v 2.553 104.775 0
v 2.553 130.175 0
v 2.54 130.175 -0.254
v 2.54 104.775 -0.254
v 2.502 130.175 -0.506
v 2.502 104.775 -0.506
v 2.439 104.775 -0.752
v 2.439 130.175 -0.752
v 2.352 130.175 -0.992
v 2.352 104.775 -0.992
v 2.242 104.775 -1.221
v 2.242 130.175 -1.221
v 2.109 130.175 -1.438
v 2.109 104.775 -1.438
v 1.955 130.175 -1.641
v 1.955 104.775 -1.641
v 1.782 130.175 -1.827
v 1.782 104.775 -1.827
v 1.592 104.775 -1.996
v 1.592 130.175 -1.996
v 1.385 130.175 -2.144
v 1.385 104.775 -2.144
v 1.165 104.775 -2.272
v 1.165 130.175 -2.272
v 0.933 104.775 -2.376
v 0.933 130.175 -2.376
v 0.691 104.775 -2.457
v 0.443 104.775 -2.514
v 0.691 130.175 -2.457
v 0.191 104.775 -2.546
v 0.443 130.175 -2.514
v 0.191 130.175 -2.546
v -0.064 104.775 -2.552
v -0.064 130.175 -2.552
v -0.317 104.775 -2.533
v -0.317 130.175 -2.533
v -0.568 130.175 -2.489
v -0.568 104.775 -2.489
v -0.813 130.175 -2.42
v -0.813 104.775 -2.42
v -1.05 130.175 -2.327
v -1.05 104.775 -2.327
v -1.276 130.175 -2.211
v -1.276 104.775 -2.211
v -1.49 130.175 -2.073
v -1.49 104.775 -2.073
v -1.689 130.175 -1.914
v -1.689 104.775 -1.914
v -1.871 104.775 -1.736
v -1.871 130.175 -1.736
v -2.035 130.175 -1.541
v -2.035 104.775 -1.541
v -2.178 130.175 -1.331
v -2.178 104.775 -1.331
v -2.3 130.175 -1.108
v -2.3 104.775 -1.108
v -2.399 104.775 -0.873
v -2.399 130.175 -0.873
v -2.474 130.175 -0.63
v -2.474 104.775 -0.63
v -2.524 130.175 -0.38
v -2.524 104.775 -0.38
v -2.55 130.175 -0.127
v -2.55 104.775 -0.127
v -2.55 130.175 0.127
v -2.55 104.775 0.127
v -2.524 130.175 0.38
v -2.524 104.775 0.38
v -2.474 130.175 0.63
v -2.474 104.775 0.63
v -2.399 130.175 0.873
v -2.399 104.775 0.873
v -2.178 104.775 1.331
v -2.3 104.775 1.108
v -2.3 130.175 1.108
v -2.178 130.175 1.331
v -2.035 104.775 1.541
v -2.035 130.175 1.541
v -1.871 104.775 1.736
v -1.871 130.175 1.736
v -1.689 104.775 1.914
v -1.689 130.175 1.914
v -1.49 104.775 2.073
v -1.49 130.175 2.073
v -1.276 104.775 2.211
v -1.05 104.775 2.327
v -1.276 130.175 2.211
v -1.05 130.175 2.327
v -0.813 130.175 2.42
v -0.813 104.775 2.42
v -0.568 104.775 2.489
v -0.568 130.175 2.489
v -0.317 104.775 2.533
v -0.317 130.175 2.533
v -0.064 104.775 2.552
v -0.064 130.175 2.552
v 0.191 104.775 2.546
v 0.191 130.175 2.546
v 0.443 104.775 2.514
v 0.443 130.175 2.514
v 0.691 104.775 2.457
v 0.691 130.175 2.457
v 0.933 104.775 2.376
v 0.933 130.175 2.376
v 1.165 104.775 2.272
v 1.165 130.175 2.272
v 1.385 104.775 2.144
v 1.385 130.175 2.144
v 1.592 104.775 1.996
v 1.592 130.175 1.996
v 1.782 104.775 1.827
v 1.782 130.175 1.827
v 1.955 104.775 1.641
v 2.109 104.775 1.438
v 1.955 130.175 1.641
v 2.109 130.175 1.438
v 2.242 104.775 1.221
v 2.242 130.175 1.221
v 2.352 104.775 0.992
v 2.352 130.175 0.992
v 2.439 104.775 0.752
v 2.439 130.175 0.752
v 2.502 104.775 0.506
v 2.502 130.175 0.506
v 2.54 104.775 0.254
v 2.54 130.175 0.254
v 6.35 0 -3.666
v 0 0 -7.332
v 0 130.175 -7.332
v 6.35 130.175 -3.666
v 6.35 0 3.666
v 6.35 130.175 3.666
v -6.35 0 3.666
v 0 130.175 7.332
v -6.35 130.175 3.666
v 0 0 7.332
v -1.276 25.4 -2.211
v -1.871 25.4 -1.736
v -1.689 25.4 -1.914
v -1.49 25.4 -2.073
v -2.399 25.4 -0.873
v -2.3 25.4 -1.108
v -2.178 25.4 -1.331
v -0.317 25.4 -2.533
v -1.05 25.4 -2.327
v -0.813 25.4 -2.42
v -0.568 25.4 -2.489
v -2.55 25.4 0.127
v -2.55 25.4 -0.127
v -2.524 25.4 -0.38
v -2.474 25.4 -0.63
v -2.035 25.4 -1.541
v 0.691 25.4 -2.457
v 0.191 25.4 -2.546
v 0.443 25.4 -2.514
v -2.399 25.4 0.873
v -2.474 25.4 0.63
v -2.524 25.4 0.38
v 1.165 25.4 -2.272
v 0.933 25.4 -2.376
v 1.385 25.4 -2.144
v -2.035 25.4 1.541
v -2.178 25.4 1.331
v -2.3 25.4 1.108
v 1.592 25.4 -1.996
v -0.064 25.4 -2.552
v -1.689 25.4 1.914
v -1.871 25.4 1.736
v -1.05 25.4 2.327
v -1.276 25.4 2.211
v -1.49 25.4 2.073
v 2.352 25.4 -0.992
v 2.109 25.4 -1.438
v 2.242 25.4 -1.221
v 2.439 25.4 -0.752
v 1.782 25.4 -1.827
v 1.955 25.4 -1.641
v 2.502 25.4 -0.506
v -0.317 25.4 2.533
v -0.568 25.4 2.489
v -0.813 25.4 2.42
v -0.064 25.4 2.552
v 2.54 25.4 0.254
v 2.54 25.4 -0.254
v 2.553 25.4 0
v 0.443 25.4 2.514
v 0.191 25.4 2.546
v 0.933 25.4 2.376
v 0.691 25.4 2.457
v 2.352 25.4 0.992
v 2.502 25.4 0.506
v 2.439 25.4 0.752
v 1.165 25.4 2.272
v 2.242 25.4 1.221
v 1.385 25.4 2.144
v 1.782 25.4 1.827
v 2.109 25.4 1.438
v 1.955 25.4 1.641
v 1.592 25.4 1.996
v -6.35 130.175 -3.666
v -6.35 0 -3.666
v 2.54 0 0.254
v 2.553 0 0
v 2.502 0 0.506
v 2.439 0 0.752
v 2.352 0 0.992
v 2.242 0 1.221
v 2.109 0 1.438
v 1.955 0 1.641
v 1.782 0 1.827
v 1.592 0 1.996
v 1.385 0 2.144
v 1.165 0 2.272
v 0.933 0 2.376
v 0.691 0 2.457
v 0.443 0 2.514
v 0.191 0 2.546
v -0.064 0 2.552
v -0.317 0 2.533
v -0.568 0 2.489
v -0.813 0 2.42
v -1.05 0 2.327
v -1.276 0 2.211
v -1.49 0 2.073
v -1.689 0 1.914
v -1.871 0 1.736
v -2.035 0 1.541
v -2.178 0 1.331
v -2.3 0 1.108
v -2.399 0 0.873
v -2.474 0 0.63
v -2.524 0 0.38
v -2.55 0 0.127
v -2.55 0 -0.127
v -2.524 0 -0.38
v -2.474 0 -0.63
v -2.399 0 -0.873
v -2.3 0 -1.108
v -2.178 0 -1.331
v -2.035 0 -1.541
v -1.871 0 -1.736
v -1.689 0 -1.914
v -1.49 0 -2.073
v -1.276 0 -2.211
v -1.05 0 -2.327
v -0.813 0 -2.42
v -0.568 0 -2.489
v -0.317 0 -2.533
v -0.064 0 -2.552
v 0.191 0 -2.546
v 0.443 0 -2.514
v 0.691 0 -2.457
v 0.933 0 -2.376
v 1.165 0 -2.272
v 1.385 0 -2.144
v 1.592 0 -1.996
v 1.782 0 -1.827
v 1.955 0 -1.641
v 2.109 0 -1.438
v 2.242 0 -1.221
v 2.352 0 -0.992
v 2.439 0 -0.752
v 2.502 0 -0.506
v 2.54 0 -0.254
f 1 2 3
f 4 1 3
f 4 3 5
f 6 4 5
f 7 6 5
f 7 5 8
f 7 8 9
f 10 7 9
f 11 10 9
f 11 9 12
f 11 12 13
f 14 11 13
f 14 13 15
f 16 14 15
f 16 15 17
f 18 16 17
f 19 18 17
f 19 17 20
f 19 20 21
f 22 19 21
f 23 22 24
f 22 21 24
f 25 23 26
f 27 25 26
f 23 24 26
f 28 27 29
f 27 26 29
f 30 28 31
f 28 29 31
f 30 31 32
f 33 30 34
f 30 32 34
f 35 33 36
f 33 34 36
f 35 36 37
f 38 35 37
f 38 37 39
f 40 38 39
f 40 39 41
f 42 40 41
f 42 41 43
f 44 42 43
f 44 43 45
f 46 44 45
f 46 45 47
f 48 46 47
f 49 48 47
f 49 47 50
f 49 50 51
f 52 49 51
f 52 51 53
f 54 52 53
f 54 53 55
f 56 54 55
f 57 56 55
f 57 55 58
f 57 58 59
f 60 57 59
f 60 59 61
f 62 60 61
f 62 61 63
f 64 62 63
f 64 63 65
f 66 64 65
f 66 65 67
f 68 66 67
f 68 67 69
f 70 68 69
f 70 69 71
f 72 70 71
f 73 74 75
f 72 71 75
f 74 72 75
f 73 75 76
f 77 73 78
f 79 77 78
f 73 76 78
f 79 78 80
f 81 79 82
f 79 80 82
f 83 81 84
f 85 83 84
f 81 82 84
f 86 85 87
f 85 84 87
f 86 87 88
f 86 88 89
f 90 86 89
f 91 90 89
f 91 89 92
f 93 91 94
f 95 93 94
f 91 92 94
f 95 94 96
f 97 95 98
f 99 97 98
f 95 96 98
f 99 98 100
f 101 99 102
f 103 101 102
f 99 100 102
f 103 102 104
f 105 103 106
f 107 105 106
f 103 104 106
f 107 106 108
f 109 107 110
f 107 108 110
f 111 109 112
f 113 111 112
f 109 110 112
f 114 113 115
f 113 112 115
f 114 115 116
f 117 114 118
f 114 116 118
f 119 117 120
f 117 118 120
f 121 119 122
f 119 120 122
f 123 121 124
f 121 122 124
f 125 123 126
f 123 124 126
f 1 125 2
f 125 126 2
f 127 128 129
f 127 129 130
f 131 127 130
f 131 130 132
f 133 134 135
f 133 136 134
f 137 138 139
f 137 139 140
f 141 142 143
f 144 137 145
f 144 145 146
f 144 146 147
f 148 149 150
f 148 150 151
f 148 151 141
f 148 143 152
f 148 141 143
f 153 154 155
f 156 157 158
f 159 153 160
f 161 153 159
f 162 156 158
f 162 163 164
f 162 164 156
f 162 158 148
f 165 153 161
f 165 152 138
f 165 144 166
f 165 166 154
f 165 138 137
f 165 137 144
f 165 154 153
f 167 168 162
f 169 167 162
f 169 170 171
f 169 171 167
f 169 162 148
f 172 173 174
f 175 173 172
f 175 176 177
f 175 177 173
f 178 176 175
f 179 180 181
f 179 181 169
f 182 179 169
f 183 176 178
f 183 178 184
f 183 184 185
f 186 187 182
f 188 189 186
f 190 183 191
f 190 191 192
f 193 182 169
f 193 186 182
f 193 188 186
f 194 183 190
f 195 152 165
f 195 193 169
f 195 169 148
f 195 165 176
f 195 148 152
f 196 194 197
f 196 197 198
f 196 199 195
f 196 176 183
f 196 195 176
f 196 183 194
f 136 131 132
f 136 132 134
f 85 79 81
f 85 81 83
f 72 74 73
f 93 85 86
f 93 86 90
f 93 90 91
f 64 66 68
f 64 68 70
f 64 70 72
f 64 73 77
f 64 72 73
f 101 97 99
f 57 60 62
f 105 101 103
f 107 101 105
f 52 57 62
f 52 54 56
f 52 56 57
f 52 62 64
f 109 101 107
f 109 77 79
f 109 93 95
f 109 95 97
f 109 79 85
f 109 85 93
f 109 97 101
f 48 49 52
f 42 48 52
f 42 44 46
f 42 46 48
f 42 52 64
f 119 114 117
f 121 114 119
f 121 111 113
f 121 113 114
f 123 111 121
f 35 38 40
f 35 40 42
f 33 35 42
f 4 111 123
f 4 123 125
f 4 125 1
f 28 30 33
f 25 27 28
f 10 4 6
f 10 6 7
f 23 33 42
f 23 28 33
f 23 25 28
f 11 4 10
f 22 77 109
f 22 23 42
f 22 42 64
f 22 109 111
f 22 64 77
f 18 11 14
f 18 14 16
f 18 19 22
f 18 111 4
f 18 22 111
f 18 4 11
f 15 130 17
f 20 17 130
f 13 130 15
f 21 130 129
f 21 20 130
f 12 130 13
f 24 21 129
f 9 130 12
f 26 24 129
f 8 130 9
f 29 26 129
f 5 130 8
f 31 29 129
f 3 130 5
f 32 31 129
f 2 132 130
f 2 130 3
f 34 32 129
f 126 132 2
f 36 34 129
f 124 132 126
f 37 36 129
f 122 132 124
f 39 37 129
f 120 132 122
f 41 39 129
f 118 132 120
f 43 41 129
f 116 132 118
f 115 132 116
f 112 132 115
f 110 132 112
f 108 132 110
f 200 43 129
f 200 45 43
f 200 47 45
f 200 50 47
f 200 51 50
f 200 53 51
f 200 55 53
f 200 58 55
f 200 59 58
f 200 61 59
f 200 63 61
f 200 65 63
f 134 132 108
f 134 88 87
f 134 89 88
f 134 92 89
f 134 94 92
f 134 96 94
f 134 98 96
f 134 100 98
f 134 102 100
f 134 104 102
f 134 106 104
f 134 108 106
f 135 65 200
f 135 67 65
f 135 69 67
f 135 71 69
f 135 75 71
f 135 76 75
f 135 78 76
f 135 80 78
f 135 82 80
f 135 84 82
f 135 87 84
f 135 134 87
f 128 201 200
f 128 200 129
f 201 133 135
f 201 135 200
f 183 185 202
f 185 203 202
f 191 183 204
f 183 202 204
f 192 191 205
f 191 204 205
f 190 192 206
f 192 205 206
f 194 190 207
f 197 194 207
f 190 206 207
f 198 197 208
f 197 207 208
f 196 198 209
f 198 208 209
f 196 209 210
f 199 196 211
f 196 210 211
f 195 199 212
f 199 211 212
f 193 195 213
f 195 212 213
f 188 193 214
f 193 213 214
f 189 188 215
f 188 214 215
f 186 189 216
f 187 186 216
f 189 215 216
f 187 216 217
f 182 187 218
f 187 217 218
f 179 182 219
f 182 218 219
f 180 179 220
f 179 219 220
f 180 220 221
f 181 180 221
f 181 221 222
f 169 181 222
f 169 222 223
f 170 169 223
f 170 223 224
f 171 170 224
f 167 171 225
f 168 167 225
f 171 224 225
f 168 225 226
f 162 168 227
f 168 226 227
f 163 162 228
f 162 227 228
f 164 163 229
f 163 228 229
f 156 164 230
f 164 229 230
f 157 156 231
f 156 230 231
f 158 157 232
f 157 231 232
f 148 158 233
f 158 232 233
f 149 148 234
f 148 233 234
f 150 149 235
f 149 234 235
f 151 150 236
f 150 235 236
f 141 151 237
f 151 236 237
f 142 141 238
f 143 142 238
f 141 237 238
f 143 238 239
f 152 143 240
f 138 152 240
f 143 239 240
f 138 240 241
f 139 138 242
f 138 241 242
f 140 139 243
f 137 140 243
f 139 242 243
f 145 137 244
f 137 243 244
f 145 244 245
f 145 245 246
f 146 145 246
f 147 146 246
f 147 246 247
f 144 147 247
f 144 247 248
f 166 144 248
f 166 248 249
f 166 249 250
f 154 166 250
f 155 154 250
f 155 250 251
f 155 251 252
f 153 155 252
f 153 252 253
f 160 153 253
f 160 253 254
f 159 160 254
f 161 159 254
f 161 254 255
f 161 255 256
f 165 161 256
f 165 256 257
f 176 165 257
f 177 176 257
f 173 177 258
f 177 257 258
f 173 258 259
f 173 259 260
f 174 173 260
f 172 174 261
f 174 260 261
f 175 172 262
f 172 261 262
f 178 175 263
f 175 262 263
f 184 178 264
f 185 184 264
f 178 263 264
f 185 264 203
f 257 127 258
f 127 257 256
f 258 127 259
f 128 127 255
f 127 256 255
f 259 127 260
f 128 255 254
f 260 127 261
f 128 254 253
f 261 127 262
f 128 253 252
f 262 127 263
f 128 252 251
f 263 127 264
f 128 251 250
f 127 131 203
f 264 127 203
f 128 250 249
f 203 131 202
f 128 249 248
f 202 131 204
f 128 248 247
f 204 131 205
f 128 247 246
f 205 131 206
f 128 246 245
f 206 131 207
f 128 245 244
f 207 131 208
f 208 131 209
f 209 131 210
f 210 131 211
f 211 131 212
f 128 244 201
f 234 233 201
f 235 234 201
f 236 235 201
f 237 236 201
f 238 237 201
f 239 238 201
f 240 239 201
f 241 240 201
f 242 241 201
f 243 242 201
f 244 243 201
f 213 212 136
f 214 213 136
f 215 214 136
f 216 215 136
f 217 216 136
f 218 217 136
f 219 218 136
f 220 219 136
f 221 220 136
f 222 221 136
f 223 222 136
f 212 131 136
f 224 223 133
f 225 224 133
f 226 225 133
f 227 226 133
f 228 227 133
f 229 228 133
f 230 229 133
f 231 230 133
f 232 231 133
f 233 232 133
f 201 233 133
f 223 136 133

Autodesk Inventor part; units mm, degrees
ref_plane "YZ Plane" through (0, 0, 0) normal (1, 0, 0) x (0, 1, 0)
ref_plane "XZ Plane" through (0, 0, 0) normal (0, 1, 0) x (-1, 0, 0)
ref_plane "XY Plane" through (0, 0, 0) normal (0, 0, 1) x (1, 0, 0)
sketch "Sketch1" plane through (0, 0, 0) normal (0, 1, 0) x (-1, 0, 0)
  line L0 (-6.35, -3.6662) -> (-6.35, 3.6662)
  line L1 (-6.35, 3.6662) -> (0, 7.3323)
  line L2 (0, 7.3323) -> (6.35, 3.6662)
  line L3 (6.35, 3.6662) -> (6.35, -3.6662)
  line L4 (6.35, -3.6662) -> (0, -7.3323)
  line L5 (0, -7.3323) -> (-6.35, -3.6662)
  point P0 (0, 0)
  point P1 (0, 0)
  dimension "d0" = 12.7
extrude "Extrusion1" add sketch "Sketch1" along normal blind 130.175
sketch "Sketch3" plane through (0, 130.175, 0) normal (0, 1, 0) x (1, 0, 0)
  circle A0 centre (0, 0) radius 2.5527
  dimension "d3" = 5.1054
extrude "Extrusion2" cut sketch "Sketch3" against normal blind 25.4
sketch "Sketch4" plane through (0, 0, 0) normal (0, -1, 0) x (1, 0, 0)
  circle A0 centre (0, 0) radius 2.5527
  dimension "d6" = 5.1054
extrude "Extrusion3" cut sketch "Sketch4" against normal blind 25.4
properties part number "INDX_017_Mainhex" material "Aluminum 6061"
